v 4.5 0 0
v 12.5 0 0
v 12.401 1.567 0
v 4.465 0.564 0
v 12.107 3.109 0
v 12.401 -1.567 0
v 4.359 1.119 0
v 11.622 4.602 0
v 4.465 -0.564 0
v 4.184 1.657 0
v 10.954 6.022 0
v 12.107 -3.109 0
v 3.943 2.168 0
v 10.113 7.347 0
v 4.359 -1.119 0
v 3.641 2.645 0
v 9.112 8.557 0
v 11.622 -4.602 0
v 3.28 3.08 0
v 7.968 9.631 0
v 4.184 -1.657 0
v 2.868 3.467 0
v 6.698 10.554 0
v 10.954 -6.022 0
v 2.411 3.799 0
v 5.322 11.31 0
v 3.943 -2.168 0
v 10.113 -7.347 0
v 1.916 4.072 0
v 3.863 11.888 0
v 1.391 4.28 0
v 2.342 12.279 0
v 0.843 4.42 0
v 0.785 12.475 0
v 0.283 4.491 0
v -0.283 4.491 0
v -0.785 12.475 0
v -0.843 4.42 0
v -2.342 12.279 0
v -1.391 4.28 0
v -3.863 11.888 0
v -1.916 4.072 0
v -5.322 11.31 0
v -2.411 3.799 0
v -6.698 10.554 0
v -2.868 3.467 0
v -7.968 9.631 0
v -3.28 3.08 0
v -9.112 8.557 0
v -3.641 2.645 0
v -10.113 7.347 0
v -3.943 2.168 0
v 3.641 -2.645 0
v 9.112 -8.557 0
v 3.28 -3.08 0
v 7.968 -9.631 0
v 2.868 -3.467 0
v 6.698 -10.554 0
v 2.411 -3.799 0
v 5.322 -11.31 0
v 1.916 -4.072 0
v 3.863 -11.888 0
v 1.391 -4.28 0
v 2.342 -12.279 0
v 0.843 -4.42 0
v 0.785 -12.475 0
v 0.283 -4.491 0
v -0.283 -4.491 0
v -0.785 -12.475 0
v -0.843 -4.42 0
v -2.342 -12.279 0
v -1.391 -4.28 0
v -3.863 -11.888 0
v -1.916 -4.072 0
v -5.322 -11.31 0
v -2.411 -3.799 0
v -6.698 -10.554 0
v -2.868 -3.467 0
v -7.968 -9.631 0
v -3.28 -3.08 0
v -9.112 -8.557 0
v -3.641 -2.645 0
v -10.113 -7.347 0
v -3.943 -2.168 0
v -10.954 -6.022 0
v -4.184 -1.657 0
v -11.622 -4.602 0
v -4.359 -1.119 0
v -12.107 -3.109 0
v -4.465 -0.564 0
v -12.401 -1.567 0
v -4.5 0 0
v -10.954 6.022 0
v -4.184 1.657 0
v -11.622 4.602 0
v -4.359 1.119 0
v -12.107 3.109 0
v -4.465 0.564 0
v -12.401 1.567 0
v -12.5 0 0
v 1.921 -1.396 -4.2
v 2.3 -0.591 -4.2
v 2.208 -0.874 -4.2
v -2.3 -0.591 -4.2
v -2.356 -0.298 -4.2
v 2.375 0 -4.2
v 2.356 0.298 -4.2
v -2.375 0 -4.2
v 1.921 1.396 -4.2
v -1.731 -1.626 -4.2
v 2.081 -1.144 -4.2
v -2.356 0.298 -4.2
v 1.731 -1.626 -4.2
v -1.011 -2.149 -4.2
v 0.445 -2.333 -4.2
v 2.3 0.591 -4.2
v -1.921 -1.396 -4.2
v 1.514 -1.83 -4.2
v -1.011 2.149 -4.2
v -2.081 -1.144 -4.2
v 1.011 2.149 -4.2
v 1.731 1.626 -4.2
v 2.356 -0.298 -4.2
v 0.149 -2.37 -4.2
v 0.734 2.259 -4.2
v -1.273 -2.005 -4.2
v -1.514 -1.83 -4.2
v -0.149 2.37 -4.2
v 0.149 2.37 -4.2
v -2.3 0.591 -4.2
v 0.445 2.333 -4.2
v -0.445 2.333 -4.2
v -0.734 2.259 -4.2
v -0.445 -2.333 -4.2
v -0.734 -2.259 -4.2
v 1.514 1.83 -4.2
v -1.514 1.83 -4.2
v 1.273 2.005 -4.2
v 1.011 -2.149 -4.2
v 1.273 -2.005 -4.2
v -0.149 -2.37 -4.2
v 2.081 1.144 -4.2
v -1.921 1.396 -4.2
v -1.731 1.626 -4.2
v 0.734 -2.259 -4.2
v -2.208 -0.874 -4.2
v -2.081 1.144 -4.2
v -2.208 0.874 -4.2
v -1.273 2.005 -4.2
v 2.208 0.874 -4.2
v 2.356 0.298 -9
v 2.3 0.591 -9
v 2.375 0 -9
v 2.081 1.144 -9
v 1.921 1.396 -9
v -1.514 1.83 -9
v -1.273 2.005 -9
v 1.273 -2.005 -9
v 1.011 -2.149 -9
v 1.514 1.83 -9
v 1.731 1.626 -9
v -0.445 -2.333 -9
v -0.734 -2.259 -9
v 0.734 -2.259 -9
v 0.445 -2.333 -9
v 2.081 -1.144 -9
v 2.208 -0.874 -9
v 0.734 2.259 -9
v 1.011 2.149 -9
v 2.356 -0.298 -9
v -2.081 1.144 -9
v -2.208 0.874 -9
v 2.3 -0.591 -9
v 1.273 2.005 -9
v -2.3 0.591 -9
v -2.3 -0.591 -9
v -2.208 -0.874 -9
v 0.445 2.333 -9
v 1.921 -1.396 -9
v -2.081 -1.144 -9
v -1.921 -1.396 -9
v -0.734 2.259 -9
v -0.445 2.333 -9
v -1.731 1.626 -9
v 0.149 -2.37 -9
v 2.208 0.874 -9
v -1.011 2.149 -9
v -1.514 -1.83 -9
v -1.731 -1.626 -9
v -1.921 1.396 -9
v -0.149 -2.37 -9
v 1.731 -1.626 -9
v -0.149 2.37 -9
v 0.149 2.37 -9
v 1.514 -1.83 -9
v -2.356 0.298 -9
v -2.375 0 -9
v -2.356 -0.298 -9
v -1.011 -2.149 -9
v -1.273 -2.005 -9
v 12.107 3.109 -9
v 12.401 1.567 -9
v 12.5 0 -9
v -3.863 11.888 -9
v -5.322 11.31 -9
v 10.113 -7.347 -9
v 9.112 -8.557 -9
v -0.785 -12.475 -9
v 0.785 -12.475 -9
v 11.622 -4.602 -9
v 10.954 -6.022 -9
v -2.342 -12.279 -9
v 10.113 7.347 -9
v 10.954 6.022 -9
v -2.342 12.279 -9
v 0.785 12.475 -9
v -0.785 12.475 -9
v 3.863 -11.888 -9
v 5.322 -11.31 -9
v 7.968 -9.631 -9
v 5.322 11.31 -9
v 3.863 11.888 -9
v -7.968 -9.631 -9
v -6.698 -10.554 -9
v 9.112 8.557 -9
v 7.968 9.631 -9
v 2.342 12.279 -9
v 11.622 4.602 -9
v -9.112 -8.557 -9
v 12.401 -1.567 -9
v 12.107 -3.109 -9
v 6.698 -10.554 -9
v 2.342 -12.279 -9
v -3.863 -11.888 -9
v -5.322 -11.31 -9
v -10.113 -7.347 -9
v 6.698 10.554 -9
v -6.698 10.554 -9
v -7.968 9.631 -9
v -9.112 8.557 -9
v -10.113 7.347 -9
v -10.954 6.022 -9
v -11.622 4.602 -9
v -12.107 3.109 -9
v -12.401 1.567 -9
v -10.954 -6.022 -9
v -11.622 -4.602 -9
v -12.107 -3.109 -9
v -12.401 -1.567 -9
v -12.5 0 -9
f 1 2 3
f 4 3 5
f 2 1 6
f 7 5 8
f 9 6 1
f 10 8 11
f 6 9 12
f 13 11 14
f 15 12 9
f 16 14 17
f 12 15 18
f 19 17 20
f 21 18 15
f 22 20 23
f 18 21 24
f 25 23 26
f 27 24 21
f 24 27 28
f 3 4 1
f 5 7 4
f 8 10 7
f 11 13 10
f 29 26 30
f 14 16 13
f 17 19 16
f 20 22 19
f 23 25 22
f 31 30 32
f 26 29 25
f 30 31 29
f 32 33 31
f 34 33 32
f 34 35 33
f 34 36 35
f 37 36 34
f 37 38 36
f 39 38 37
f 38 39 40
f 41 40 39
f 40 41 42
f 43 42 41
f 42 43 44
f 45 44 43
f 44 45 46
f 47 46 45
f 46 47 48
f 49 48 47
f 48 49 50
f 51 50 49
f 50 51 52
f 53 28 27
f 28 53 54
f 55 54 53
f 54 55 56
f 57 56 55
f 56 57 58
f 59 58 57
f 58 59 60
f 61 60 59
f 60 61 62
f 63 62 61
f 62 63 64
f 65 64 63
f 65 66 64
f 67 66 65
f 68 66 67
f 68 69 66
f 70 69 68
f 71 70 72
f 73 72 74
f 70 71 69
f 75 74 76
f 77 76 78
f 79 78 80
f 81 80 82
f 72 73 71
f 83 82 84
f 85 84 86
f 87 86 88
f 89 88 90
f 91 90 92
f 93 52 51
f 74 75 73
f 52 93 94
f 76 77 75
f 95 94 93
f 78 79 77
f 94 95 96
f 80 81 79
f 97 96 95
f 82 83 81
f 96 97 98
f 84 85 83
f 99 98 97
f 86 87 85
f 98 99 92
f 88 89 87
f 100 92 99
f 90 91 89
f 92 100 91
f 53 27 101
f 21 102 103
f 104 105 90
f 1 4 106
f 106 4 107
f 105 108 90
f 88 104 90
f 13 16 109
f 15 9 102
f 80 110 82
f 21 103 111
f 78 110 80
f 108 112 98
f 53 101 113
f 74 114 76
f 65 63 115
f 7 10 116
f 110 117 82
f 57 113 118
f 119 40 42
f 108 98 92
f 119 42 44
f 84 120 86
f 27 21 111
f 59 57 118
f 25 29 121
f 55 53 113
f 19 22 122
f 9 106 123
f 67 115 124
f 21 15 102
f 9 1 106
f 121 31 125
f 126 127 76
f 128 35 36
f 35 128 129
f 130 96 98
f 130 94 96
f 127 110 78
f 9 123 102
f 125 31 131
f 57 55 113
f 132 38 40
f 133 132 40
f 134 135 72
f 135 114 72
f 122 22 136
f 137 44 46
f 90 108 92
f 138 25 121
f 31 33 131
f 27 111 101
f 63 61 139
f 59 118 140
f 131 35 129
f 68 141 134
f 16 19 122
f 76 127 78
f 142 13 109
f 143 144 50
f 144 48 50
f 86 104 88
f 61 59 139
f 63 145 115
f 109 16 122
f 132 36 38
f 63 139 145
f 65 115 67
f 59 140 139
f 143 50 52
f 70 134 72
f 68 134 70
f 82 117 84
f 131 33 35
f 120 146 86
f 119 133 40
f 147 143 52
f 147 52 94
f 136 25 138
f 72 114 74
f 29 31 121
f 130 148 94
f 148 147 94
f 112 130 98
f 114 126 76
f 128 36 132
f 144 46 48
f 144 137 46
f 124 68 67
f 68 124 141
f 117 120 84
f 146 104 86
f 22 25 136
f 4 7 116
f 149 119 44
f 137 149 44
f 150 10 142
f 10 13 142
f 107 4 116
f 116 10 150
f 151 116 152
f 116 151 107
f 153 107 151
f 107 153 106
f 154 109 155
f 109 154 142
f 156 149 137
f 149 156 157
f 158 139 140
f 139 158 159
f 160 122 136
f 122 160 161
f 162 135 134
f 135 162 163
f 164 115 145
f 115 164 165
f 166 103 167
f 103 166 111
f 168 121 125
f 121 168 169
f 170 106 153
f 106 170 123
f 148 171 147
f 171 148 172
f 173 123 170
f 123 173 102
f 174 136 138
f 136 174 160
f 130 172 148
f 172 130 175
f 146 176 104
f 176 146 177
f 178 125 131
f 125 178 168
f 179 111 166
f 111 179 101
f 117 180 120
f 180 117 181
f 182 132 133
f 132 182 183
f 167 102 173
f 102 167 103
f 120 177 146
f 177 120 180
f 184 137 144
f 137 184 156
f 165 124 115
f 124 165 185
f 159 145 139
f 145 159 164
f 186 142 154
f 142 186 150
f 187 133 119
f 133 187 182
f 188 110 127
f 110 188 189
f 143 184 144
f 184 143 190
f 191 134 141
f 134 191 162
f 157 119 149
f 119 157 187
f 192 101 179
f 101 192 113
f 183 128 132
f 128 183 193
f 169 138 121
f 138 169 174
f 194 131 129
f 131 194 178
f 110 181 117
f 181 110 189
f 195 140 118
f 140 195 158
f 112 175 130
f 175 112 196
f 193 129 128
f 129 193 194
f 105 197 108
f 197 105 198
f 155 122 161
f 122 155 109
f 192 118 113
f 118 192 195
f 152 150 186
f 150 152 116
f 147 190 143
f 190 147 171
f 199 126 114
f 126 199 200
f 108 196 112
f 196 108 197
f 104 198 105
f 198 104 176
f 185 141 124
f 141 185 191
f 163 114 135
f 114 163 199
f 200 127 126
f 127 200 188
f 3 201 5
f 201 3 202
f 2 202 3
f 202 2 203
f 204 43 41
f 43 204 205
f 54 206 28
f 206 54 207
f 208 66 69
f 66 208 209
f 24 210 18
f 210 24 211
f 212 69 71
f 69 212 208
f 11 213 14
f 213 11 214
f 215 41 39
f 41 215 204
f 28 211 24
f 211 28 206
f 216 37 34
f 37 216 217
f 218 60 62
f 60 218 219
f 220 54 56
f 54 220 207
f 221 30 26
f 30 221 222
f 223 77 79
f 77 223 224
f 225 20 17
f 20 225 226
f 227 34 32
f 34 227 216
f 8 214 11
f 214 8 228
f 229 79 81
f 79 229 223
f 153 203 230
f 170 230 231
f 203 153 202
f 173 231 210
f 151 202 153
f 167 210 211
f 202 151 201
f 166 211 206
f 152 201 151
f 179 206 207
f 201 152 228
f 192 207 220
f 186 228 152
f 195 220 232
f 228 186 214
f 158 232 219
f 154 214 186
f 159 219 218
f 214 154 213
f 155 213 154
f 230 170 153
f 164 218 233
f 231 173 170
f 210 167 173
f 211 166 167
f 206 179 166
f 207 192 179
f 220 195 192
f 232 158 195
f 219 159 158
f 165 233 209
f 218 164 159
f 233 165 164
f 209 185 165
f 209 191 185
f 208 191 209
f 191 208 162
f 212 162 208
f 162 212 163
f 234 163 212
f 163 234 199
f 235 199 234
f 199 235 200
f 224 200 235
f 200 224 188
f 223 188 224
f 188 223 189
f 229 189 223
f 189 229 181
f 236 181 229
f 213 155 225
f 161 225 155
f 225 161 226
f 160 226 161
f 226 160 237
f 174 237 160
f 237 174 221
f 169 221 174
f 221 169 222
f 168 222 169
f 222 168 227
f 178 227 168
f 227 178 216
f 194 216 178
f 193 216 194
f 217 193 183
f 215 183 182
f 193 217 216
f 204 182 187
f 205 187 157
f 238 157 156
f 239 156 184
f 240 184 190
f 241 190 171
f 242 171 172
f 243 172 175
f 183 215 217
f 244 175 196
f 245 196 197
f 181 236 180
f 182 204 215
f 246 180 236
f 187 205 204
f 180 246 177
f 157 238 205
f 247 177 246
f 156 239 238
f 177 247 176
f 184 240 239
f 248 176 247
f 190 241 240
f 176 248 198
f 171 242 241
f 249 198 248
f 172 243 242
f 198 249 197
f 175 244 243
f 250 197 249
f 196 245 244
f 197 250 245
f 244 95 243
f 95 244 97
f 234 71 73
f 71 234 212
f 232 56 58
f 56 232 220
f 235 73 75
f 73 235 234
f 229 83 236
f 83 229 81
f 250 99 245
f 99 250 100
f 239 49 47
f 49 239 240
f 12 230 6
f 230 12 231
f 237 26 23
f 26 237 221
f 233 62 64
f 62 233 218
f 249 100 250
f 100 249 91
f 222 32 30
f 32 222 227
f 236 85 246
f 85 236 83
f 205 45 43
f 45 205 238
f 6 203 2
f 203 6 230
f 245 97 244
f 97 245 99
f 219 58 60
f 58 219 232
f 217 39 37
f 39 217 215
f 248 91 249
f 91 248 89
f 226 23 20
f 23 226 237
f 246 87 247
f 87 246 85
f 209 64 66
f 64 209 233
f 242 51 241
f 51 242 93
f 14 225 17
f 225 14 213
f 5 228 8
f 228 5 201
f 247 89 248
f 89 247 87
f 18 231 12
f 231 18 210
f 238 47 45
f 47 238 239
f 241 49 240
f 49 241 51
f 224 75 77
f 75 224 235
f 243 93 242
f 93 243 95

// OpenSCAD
$fn = 50;

difference() {
	union() {
		translate(v = [0, 0, -9.0]) {
			cylinder(h = 9, r = 12.5);
		}
	}
	union() {
		translate(v = [0, 0, 0]) {
			rotate(a = [0, 0, 0]) {
				difference() {
					union() {
						translate(v = [0, 0, -12.0]) {
							cylinder(h = 12, r = 2.25);
						}
						translate(v = [0, 0, -4.2]) {
							cylinder(h = 4.2, r1 = 2.375, r2 = 4.5);
						}
						translate(v = [0, 0, -12.0]) {
							cylinder(h = 12, r = 2.375);
						}
						translate(v = [0, 0, -12.0]) {
							cylinder(h = 12, r = 2.25);
						}
					}
					union();
				}
			}
		}
	}
}
